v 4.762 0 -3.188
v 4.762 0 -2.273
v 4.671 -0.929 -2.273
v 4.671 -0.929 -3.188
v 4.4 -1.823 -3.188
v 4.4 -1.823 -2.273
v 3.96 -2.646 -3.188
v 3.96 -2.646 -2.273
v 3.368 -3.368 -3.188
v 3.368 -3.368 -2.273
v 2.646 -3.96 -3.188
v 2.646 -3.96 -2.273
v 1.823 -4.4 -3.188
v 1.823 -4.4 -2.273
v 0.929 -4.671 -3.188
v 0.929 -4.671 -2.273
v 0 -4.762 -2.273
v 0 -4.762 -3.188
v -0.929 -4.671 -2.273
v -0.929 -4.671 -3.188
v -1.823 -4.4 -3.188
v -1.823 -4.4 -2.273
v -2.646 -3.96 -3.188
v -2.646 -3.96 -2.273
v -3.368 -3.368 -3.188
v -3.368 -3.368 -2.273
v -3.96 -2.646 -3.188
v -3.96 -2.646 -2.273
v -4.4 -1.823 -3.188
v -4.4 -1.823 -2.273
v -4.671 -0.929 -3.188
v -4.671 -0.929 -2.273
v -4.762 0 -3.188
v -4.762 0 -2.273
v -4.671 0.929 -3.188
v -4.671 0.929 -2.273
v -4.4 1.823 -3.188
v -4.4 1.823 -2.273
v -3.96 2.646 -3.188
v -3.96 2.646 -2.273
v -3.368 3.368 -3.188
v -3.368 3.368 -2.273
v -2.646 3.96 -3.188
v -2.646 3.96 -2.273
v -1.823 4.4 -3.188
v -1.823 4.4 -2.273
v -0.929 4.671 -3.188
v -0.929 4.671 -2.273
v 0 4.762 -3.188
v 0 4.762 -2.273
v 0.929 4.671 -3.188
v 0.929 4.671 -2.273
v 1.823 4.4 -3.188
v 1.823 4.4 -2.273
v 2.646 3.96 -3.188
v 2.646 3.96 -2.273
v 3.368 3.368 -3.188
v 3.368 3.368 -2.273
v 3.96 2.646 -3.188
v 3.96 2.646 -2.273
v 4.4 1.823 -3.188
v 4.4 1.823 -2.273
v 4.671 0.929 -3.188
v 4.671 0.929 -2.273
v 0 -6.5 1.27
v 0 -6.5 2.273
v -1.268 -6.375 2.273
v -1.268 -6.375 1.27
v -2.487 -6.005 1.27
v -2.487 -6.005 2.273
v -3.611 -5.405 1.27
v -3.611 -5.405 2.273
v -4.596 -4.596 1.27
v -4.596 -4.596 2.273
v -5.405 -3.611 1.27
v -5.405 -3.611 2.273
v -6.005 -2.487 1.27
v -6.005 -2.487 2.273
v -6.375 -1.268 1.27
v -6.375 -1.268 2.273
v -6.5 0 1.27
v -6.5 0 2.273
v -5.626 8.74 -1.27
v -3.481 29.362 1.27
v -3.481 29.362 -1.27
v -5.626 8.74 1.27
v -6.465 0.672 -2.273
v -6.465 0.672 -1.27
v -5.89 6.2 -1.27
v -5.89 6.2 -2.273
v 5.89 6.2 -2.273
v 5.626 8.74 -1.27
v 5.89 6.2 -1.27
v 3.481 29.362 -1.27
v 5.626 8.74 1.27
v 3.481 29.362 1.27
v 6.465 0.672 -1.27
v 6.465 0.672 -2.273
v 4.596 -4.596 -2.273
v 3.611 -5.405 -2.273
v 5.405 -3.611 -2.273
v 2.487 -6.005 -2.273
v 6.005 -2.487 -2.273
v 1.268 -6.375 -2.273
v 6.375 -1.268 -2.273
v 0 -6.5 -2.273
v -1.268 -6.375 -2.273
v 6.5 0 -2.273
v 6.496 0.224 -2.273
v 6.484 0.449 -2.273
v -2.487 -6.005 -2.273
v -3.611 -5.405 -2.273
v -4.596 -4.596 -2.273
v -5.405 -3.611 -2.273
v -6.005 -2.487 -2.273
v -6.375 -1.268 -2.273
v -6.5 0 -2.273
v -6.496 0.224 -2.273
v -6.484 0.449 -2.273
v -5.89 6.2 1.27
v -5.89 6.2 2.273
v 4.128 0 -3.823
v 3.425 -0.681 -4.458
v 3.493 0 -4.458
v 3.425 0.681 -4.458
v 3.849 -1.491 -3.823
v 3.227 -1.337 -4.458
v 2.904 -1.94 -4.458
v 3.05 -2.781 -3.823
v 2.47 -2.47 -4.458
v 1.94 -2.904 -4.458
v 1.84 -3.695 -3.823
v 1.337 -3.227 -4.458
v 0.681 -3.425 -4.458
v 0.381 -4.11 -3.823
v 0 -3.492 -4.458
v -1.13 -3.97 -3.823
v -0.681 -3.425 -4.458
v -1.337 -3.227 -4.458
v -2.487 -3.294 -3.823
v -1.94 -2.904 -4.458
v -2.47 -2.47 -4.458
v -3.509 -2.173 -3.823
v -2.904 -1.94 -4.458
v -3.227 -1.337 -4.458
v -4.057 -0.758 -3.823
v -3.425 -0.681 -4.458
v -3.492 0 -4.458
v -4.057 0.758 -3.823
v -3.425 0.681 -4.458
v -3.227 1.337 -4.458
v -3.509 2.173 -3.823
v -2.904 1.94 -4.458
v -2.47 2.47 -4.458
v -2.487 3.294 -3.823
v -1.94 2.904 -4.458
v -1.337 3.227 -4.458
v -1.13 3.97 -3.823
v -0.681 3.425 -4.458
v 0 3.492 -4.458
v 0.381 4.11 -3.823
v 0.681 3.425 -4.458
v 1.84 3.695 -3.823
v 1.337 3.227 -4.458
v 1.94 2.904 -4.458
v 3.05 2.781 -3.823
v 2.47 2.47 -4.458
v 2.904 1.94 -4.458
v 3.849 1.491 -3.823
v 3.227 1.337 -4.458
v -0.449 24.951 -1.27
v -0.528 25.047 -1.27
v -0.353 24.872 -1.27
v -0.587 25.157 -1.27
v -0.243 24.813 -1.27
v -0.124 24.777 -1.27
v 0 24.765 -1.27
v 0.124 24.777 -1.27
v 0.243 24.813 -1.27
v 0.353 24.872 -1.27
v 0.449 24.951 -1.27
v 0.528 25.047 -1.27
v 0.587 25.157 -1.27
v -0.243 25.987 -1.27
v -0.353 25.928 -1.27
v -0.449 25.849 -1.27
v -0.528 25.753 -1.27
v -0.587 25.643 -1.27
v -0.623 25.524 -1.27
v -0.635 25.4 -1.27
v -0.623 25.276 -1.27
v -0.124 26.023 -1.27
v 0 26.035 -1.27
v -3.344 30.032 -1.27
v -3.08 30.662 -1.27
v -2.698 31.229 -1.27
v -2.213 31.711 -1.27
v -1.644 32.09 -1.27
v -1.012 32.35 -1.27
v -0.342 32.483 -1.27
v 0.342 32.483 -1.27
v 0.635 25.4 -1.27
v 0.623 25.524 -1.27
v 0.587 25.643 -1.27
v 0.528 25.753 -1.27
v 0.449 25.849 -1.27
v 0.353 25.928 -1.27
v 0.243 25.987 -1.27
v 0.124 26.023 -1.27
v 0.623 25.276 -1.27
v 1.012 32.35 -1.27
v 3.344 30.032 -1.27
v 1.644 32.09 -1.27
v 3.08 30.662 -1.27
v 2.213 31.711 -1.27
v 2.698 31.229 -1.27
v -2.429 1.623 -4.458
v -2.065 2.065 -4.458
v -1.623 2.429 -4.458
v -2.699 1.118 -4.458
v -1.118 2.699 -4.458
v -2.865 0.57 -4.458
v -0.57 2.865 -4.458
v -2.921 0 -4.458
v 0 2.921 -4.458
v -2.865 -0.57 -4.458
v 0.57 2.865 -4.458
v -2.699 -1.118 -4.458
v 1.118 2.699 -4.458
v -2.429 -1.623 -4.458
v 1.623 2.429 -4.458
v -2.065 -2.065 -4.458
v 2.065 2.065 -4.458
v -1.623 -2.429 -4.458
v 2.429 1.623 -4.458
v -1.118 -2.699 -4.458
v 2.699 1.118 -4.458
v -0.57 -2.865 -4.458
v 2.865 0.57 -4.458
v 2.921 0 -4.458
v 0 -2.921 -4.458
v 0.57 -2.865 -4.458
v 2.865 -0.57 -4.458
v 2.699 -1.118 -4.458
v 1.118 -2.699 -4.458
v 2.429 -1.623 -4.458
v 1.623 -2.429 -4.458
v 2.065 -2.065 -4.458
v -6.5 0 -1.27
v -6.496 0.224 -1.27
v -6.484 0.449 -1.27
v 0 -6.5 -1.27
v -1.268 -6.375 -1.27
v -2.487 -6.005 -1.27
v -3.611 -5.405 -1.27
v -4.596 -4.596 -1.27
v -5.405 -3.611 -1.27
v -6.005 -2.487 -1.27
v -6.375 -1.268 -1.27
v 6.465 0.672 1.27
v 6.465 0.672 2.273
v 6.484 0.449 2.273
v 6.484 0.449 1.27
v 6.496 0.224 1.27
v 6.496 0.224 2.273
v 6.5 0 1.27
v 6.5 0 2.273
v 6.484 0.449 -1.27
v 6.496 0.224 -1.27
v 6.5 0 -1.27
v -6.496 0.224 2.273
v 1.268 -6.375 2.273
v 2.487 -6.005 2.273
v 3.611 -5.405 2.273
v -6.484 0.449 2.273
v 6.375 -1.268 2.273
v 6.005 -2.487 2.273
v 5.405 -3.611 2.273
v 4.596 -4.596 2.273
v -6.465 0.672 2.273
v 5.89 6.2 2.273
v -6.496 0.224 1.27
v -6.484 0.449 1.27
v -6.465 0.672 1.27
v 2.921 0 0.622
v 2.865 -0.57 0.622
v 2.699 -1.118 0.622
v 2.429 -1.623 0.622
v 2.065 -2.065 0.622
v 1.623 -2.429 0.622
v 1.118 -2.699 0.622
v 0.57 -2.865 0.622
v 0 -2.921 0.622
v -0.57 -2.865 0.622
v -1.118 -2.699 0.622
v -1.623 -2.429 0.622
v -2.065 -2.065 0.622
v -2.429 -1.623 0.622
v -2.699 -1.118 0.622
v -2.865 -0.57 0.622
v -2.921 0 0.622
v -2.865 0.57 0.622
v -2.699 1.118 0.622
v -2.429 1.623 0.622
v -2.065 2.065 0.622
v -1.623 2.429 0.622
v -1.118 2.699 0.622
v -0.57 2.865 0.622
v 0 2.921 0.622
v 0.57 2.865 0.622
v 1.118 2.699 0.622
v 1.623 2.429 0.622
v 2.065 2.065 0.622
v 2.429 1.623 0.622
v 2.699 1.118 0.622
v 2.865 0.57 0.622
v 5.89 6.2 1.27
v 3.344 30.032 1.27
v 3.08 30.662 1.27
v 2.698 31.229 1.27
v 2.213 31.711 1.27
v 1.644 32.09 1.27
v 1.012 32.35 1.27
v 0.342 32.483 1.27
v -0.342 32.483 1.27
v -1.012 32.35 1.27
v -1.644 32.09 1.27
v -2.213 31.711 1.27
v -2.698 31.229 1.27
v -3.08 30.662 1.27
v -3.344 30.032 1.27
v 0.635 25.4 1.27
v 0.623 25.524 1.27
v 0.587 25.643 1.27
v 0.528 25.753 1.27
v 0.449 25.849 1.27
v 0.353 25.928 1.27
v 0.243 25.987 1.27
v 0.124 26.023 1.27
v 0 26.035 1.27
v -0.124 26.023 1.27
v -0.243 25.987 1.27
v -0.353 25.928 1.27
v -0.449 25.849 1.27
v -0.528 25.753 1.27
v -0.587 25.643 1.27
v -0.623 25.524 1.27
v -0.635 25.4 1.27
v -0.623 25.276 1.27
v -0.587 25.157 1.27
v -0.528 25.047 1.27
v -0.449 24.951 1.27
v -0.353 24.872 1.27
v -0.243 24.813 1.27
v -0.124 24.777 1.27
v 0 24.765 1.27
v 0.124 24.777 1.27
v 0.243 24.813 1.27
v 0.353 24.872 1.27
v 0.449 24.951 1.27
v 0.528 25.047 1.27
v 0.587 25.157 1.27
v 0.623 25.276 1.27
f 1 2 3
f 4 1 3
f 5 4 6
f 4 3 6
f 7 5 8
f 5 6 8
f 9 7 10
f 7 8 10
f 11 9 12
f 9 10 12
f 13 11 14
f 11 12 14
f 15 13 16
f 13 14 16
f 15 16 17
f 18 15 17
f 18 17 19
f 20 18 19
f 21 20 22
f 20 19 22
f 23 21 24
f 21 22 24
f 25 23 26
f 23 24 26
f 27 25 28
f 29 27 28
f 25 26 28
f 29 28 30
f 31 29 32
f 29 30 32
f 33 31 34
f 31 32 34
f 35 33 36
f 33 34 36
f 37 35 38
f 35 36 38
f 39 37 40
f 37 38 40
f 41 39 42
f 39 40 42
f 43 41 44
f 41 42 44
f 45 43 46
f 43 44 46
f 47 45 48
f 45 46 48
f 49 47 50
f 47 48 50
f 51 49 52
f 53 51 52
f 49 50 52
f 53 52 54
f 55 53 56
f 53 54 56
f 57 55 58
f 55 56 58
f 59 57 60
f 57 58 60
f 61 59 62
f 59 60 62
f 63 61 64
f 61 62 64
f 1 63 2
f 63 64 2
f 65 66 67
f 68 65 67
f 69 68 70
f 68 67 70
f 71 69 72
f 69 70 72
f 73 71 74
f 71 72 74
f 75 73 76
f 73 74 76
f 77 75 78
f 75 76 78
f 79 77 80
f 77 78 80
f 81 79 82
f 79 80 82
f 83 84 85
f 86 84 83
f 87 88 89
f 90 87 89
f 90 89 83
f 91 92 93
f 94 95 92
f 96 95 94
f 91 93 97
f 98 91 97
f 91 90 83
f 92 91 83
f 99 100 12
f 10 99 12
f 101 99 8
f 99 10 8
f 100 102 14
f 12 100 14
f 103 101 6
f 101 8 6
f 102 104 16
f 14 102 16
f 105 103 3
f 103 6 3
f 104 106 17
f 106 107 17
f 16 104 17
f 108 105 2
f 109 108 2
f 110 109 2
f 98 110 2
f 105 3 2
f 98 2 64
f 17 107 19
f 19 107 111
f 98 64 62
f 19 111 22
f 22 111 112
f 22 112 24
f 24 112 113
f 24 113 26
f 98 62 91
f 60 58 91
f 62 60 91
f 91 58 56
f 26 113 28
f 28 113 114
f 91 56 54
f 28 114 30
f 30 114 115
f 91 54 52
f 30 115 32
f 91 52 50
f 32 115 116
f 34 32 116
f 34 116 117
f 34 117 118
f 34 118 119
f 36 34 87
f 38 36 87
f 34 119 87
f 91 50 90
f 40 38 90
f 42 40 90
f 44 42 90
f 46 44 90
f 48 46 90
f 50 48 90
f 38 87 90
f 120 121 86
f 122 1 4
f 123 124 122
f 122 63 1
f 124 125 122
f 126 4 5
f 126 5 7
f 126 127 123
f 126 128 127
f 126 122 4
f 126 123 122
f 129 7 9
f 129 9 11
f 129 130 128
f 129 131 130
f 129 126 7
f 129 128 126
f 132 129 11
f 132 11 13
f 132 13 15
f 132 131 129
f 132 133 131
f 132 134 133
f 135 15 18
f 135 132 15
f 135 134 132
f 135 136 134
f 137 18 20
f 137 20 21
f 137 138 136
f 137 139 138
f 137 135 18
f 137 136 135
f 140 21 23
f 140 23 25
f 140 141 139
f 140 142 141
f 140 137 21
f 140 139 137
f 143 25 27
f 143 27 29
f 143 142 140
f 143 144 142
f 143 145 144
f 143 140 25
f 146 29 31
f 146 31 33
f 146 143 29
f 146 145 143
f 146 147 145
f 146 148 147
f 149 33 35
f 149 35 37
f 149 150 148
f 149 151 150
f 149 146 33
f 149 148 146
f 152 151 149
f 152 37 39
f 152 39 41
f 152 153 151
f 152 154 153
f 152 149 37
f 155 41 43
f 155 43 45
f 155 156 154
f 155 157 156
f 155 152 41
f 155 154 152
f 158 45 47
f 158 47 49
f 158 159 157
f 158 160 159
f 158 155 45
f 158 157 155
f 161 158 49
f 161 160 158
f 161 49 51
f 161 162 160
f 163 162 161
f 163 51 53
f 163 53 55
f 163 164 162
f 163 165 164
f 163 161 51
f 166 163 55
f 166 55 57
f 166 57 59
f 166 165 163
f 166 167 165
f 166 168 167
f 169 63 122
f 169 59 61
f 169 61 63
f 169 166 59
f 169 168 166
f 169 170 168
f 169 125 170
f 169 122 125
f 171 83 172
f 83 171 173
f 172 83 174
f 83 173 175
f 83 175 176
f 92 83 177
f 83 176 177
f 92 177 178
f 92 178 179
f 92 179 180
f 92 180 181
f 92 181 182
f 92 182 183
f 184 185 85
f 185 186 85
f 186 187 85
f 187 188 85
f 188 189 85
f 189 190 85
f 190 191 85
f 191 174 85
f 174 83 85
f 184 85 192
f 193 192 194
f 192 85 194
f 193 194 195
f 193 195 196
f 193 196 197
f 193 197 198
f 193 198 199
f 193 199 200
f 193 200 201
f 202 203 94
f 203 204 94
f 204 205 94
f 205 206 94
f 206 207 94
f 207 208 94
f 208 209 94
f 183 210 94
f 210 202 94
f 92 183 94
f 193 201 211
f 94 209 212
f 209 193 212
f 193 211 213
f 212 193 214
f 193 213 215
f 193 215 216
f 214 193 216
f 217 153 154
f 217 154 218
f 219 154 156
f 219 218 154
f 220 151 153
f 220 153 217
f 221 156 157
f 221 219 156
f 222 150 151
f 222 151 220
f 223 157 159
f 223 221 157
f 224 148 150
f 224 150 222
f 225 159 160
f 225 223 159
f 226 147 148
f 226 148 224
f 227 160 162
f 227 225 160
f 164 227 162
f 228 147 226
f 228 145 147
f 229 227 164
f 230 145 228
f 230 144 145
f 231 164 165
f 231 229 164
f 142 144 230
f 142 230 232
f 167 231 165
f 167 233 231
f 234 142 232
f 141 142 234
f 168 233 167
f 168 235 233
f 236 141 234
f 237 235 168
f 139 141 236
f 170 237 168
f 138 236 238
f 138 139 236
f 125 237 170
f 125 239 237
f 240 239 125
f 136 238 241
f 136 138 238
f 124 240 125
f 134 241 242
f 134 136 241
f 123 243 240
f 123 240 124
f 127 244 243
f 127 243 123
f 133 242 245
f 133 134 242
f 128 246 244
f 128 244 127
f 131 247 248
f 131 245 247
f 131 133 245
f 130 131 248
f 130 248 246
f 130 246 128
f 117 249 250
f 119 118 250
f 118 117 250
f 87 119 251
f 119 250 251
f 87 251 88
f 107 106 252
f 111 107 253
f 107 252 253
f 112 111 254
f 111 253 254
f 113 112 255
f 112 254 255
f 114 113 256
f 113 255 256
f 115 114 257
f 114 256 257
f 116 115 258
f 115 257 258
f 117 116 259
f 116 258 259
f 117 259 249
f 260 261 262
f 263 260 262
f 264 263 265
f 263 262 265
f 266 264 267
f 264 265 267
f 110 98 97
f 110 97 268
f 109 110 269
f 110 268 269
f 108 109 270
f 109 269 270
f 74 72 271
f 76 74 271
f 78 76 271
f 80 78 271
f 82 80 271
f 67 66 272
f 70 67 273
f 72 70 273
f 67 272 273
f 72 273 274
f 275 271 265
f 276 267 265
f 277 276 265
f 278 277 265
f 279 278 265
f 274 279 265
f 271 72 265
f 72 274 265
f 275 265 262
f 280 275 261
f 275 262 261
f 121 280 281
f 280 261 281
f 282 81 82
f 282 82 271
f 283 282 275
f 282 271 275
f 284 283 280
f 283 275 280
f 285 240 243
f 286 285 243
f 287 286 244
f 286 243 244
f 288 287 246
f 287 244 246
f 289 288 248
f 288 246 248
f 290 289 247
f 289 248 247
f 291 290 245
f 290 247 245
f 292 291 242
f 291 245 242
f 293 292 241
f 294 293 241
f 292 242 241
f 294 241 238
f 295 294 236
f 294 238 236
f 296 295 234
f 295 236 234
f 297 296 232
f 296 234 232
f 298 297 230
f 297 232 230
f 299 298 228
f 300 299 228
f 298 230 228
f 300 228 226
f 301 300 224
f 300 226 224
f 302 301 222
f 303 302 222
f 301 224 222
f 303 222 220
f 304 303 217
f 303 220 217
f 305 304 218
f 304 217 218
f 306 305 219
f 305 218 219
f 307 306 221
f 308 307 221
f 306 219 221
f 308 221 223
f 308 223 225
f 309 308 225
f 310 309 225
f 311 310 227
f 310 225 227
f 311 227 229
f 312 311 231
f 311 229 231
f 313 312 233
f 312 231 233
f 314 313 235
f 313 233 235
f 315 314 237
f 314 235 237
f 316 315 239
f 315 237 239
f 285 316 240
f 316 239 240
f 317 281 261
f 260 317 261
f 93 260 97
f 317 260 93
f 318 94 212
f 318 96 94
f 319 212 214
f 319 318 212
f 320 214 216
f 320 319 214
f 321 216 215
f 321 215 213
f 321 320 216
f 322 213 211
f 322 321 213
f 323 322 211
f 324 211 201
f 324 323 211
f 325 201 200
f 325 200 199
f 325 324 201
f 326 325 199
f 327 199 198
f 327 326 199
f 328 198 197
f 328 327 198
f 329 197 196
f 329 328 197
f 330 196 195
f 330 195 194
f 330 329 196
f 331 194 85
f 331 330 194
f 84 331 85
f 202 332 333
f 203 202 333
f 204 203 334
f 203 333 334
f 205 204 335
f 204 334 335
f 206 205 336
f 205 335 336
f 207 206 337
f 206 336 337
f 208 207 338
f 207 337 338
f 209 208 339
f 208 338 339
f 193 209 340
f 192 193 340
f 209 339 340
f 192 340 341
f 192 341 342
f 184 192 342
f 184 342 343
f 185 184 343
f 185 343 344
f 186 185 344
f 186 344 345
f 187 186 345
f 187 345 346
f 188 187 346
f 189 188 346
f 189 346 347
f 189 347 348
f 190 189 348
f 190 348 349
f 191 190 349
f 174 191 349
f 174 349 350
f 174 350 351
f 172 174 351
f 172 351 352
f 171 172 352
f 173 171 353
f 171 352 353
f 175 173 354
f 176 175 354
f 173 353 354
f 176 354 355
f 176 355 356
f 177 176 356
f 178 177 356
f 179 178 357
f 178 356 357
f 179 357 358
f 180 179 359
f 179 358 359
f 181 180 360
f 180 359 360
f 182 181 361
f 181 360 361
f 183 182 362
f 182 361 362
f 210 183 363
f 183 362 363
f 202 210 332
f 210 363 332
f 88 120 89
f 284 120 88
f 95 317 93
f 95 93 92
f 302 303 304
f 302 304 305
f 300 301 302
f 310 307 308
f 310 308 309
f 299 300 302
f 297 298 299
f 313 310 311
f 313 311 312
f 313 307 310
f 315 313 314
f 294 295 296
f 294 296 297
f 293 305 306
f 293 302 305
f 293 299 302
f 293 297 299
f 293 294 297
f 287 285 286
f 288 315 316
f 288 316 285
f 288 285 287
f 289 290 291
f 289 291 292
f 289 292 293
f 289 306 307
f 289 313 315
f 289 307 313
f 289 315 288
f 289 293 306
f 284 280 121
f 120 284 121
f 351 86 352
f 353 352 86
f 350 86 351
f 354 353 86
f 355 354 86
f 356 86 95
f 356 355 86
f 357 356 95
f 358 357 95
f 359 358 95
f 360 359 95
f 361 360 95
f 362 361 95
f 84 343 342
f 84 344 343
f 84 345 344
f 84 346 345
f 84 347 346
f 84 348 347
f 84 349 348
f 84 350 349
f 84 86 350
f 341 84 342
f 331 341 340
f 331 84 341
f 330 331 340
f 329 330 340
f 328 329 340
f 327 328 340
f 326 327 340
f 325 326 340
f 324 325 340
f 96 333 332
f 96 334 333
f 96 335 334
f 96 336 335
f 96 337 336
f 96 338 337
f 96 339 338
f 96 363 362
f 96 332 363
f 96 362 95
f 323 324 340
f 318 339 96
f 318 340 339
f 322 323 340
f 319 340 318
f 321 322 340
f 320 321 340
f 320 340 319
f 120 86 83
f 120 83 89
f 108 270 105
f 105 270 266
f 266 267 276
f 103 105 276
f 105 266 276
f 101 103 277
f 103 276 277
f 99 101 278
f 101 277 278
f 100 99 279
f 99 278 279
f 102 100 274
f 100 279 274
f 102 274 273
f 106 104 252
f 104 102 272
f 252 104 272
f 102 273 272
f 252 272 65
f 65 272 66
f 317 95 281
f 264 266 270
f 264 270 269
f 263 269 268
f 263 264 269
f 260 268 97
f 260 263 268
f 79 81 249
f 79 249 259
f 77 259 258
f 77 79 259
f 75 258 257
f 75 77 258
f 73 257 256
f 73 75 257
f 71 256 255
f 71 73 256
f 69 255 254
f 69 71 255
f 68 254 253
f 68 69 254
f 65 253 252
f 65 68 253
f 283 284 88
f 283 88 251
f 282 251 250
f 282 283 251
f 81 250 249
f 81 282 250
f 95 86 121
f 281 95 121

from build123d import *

# Parameters (mm, degrees)
F1_DEPTH  = 1.27
F2_W      = 12.7
F2_H      = 1.0033
F3_DEPTH  = 6.5
F5_DEPTH  = 4.5476
F6_R      = 4.7625
F7_DEPTH  = 2.1844
F8_SIZE   = 1.27
F9_R      = 2.921
F10_DEPTH = 5.08
F11_R     = 0.635
F12_DEPTH = 25.4


# Not quite as in the source:
# - after a boolean that leaves OpenCascade's solid faulty, fix() repairs it


with BuildPart() as f1:
    # F0 (on Top) → F1 (new body, symmetric)
    with BuildSketch(Plane.XY):
        with BuildLine():
            ThreePointArc((-6.465126425, 0.6724137931), (-0.3366587573, -6.4912757514), (6.5, 0))
            ThreePointArc((6.5, 0), (6.4912757514, 0.3366587573), (6.465126425, 0.6724137931))
            ThreePointArc((6.465126425, 0.6724137931), (0, 6.5), (-6.465126425, 0.6724137931))
        make_face()
        with BuildLine():
            ThreePointArc((-6.465126425, 0.6724137931), (0, 6.5), (6.465126425, 0.6724137931))
            Line((6.465126425, 0.6724137931), (3.4812219211, 29.3620689655))
            ThreePointArc((3.4812219211, 29.3620689655), (3.4953023277, 29.1812777924), (3.5, 29))
            ThreePointArc((3.5, 29), (-0.1812777924, 25.5046976723), (-3.4812219211, 29.3620689655))
            Line((-3.4812219211, 29.3620689655), (-6.465126425, 0.6724137931))
        make_face()
        with BuildLine():
            ThreePointArc((3.5, 29), (3.4953023277, 29.1812777924), (3.4812219211, 29.3620689655))
            ThreePointArc((3.4812219211, 29.3620689655), (0, 32.5), (-3.4812219211, 29.3620689655))
            ThreePointArc((-3.4812219211, 29.3620689655), (-0.1812777924, 25.5046976723), (3.5, 29))
        make_face()
    extrude(amount=F1_DEPTH, both=True)

    # F2 (on Right) → F3 (join, symmetric)
    with BuildSketch(Plane.YZ):
        with Locations((-0.15, -1.77165)):
            Rectangle(F2_W, F2_H)
        with Locations((-0.15, 1.77165)):
            Rectangle(F2_W, F2_H)
        Polygon((8.74, 1.27), (6.2, 2.2733), (6.2, 1.27), align=None)
        Polygon((8.74, -1.27), (6.2, -1.27), (6.2, -2.2733), align=None)
    extrude(amount=F3_DEPTH, both=True)

    # F4 (on face) → F5 (cut, through all)
    with BuildSketch(Plane.XY.offset(2.2733)):
        Polygon((5.6260467402, 8.74), (5.8902227087, 6.2), (6.5, 6.2), (6.5, 8.74), align=None)
        with BuildLine():
            Line((6.5, 6.2), (5.8902227087, 6.2))
            Line((5.8902227087, 6.2), (6.465126425, 0.6724137931))
            ThreePointArc((6.465126425, 0.6724137931), (6.4912757514, 0.3366587573), (6.5, 0))
            Line((6.5, 0), (6.5, 6.2))
        make_face()
        with BuildLine():
            ThreePointArc((6.5, 0), (4.5961940777, -4.5961940777), (0, -6.5))
            Line((0, -6.5), (6.5, -6.5))
            Line((6.5, -6.5), (6.5, 0))
        make_face()
        with BuildLine():
            ThreePointArc((0, -6.5), (-4.5961940777, -4.5961940777), (-6.5, 0))
            Line((-6.5, 0), (-6.5, -6.5))
            Line((-6.5, -6.5), (0, -6.5))
        make_face()
        Polygon((-6.5, 6.2), (-5.8902227087, 6.2), (-5.6260467402, 8.74), (-6.5, 8.74), align=None)
        with BuildLine():
            ThreePointArc((-6.5, 0), (-6.4912757514, 0.3366587573), (-6.465126425, 0.6724137931))
            Line((-6.465126425, 0.6724137931), (-5.8902227087, 6.2))
            Line((-5.8902227087, 6.2), (-6.5, 6.2))
            Line((-6.5, 6.2), (-6.5, 0))
        make_face()
    extrude(amount=-F5_DEPTH, mode=Mode.SUBTRACT)

    add(f1.part.fix(), mode=Mode.REPLACE)

    # F6 (on face) → F7 (join)
    with BuildSketch(Plane(origin=(0, 0, -2.2733), x_dir=(1, 0, 0), z_dir=(0, 0, -1))):
        Circle(F6_R)
    extrude(amount=F7_DEPTH)

    # F8
    f8_edges = [f1.edges().sort_by_distance(p)[0] for p in [
        (-4.7625, 0, -4.4577),
    ]]
    chamfer(f8_edges, length=F8_SIZE)

    # F9 (on face) → F10 (cut)
    with BuildSketch(Plane(origin=(0, 0, -4.4577), x_dir=(1, 0, 0), z_dir=(0, 0, -1))):
        Circle(F9_R)
    extrude(amount=-F10_DEPTH, mode=Mode.SUBTRACT)

    add(f1.part.fix(), mode=Mode.REPLACE)

    # F11 (on face) → F12 (cut)
    with BuildSketch(Plane.XY.offset(1.27)):
        with Locations((0, 25.4)):
            Circle(F11_R)
    extrude(amount=-F12_DEPTH, mode=Mode.SUBTRACT)


solid = f1.part
